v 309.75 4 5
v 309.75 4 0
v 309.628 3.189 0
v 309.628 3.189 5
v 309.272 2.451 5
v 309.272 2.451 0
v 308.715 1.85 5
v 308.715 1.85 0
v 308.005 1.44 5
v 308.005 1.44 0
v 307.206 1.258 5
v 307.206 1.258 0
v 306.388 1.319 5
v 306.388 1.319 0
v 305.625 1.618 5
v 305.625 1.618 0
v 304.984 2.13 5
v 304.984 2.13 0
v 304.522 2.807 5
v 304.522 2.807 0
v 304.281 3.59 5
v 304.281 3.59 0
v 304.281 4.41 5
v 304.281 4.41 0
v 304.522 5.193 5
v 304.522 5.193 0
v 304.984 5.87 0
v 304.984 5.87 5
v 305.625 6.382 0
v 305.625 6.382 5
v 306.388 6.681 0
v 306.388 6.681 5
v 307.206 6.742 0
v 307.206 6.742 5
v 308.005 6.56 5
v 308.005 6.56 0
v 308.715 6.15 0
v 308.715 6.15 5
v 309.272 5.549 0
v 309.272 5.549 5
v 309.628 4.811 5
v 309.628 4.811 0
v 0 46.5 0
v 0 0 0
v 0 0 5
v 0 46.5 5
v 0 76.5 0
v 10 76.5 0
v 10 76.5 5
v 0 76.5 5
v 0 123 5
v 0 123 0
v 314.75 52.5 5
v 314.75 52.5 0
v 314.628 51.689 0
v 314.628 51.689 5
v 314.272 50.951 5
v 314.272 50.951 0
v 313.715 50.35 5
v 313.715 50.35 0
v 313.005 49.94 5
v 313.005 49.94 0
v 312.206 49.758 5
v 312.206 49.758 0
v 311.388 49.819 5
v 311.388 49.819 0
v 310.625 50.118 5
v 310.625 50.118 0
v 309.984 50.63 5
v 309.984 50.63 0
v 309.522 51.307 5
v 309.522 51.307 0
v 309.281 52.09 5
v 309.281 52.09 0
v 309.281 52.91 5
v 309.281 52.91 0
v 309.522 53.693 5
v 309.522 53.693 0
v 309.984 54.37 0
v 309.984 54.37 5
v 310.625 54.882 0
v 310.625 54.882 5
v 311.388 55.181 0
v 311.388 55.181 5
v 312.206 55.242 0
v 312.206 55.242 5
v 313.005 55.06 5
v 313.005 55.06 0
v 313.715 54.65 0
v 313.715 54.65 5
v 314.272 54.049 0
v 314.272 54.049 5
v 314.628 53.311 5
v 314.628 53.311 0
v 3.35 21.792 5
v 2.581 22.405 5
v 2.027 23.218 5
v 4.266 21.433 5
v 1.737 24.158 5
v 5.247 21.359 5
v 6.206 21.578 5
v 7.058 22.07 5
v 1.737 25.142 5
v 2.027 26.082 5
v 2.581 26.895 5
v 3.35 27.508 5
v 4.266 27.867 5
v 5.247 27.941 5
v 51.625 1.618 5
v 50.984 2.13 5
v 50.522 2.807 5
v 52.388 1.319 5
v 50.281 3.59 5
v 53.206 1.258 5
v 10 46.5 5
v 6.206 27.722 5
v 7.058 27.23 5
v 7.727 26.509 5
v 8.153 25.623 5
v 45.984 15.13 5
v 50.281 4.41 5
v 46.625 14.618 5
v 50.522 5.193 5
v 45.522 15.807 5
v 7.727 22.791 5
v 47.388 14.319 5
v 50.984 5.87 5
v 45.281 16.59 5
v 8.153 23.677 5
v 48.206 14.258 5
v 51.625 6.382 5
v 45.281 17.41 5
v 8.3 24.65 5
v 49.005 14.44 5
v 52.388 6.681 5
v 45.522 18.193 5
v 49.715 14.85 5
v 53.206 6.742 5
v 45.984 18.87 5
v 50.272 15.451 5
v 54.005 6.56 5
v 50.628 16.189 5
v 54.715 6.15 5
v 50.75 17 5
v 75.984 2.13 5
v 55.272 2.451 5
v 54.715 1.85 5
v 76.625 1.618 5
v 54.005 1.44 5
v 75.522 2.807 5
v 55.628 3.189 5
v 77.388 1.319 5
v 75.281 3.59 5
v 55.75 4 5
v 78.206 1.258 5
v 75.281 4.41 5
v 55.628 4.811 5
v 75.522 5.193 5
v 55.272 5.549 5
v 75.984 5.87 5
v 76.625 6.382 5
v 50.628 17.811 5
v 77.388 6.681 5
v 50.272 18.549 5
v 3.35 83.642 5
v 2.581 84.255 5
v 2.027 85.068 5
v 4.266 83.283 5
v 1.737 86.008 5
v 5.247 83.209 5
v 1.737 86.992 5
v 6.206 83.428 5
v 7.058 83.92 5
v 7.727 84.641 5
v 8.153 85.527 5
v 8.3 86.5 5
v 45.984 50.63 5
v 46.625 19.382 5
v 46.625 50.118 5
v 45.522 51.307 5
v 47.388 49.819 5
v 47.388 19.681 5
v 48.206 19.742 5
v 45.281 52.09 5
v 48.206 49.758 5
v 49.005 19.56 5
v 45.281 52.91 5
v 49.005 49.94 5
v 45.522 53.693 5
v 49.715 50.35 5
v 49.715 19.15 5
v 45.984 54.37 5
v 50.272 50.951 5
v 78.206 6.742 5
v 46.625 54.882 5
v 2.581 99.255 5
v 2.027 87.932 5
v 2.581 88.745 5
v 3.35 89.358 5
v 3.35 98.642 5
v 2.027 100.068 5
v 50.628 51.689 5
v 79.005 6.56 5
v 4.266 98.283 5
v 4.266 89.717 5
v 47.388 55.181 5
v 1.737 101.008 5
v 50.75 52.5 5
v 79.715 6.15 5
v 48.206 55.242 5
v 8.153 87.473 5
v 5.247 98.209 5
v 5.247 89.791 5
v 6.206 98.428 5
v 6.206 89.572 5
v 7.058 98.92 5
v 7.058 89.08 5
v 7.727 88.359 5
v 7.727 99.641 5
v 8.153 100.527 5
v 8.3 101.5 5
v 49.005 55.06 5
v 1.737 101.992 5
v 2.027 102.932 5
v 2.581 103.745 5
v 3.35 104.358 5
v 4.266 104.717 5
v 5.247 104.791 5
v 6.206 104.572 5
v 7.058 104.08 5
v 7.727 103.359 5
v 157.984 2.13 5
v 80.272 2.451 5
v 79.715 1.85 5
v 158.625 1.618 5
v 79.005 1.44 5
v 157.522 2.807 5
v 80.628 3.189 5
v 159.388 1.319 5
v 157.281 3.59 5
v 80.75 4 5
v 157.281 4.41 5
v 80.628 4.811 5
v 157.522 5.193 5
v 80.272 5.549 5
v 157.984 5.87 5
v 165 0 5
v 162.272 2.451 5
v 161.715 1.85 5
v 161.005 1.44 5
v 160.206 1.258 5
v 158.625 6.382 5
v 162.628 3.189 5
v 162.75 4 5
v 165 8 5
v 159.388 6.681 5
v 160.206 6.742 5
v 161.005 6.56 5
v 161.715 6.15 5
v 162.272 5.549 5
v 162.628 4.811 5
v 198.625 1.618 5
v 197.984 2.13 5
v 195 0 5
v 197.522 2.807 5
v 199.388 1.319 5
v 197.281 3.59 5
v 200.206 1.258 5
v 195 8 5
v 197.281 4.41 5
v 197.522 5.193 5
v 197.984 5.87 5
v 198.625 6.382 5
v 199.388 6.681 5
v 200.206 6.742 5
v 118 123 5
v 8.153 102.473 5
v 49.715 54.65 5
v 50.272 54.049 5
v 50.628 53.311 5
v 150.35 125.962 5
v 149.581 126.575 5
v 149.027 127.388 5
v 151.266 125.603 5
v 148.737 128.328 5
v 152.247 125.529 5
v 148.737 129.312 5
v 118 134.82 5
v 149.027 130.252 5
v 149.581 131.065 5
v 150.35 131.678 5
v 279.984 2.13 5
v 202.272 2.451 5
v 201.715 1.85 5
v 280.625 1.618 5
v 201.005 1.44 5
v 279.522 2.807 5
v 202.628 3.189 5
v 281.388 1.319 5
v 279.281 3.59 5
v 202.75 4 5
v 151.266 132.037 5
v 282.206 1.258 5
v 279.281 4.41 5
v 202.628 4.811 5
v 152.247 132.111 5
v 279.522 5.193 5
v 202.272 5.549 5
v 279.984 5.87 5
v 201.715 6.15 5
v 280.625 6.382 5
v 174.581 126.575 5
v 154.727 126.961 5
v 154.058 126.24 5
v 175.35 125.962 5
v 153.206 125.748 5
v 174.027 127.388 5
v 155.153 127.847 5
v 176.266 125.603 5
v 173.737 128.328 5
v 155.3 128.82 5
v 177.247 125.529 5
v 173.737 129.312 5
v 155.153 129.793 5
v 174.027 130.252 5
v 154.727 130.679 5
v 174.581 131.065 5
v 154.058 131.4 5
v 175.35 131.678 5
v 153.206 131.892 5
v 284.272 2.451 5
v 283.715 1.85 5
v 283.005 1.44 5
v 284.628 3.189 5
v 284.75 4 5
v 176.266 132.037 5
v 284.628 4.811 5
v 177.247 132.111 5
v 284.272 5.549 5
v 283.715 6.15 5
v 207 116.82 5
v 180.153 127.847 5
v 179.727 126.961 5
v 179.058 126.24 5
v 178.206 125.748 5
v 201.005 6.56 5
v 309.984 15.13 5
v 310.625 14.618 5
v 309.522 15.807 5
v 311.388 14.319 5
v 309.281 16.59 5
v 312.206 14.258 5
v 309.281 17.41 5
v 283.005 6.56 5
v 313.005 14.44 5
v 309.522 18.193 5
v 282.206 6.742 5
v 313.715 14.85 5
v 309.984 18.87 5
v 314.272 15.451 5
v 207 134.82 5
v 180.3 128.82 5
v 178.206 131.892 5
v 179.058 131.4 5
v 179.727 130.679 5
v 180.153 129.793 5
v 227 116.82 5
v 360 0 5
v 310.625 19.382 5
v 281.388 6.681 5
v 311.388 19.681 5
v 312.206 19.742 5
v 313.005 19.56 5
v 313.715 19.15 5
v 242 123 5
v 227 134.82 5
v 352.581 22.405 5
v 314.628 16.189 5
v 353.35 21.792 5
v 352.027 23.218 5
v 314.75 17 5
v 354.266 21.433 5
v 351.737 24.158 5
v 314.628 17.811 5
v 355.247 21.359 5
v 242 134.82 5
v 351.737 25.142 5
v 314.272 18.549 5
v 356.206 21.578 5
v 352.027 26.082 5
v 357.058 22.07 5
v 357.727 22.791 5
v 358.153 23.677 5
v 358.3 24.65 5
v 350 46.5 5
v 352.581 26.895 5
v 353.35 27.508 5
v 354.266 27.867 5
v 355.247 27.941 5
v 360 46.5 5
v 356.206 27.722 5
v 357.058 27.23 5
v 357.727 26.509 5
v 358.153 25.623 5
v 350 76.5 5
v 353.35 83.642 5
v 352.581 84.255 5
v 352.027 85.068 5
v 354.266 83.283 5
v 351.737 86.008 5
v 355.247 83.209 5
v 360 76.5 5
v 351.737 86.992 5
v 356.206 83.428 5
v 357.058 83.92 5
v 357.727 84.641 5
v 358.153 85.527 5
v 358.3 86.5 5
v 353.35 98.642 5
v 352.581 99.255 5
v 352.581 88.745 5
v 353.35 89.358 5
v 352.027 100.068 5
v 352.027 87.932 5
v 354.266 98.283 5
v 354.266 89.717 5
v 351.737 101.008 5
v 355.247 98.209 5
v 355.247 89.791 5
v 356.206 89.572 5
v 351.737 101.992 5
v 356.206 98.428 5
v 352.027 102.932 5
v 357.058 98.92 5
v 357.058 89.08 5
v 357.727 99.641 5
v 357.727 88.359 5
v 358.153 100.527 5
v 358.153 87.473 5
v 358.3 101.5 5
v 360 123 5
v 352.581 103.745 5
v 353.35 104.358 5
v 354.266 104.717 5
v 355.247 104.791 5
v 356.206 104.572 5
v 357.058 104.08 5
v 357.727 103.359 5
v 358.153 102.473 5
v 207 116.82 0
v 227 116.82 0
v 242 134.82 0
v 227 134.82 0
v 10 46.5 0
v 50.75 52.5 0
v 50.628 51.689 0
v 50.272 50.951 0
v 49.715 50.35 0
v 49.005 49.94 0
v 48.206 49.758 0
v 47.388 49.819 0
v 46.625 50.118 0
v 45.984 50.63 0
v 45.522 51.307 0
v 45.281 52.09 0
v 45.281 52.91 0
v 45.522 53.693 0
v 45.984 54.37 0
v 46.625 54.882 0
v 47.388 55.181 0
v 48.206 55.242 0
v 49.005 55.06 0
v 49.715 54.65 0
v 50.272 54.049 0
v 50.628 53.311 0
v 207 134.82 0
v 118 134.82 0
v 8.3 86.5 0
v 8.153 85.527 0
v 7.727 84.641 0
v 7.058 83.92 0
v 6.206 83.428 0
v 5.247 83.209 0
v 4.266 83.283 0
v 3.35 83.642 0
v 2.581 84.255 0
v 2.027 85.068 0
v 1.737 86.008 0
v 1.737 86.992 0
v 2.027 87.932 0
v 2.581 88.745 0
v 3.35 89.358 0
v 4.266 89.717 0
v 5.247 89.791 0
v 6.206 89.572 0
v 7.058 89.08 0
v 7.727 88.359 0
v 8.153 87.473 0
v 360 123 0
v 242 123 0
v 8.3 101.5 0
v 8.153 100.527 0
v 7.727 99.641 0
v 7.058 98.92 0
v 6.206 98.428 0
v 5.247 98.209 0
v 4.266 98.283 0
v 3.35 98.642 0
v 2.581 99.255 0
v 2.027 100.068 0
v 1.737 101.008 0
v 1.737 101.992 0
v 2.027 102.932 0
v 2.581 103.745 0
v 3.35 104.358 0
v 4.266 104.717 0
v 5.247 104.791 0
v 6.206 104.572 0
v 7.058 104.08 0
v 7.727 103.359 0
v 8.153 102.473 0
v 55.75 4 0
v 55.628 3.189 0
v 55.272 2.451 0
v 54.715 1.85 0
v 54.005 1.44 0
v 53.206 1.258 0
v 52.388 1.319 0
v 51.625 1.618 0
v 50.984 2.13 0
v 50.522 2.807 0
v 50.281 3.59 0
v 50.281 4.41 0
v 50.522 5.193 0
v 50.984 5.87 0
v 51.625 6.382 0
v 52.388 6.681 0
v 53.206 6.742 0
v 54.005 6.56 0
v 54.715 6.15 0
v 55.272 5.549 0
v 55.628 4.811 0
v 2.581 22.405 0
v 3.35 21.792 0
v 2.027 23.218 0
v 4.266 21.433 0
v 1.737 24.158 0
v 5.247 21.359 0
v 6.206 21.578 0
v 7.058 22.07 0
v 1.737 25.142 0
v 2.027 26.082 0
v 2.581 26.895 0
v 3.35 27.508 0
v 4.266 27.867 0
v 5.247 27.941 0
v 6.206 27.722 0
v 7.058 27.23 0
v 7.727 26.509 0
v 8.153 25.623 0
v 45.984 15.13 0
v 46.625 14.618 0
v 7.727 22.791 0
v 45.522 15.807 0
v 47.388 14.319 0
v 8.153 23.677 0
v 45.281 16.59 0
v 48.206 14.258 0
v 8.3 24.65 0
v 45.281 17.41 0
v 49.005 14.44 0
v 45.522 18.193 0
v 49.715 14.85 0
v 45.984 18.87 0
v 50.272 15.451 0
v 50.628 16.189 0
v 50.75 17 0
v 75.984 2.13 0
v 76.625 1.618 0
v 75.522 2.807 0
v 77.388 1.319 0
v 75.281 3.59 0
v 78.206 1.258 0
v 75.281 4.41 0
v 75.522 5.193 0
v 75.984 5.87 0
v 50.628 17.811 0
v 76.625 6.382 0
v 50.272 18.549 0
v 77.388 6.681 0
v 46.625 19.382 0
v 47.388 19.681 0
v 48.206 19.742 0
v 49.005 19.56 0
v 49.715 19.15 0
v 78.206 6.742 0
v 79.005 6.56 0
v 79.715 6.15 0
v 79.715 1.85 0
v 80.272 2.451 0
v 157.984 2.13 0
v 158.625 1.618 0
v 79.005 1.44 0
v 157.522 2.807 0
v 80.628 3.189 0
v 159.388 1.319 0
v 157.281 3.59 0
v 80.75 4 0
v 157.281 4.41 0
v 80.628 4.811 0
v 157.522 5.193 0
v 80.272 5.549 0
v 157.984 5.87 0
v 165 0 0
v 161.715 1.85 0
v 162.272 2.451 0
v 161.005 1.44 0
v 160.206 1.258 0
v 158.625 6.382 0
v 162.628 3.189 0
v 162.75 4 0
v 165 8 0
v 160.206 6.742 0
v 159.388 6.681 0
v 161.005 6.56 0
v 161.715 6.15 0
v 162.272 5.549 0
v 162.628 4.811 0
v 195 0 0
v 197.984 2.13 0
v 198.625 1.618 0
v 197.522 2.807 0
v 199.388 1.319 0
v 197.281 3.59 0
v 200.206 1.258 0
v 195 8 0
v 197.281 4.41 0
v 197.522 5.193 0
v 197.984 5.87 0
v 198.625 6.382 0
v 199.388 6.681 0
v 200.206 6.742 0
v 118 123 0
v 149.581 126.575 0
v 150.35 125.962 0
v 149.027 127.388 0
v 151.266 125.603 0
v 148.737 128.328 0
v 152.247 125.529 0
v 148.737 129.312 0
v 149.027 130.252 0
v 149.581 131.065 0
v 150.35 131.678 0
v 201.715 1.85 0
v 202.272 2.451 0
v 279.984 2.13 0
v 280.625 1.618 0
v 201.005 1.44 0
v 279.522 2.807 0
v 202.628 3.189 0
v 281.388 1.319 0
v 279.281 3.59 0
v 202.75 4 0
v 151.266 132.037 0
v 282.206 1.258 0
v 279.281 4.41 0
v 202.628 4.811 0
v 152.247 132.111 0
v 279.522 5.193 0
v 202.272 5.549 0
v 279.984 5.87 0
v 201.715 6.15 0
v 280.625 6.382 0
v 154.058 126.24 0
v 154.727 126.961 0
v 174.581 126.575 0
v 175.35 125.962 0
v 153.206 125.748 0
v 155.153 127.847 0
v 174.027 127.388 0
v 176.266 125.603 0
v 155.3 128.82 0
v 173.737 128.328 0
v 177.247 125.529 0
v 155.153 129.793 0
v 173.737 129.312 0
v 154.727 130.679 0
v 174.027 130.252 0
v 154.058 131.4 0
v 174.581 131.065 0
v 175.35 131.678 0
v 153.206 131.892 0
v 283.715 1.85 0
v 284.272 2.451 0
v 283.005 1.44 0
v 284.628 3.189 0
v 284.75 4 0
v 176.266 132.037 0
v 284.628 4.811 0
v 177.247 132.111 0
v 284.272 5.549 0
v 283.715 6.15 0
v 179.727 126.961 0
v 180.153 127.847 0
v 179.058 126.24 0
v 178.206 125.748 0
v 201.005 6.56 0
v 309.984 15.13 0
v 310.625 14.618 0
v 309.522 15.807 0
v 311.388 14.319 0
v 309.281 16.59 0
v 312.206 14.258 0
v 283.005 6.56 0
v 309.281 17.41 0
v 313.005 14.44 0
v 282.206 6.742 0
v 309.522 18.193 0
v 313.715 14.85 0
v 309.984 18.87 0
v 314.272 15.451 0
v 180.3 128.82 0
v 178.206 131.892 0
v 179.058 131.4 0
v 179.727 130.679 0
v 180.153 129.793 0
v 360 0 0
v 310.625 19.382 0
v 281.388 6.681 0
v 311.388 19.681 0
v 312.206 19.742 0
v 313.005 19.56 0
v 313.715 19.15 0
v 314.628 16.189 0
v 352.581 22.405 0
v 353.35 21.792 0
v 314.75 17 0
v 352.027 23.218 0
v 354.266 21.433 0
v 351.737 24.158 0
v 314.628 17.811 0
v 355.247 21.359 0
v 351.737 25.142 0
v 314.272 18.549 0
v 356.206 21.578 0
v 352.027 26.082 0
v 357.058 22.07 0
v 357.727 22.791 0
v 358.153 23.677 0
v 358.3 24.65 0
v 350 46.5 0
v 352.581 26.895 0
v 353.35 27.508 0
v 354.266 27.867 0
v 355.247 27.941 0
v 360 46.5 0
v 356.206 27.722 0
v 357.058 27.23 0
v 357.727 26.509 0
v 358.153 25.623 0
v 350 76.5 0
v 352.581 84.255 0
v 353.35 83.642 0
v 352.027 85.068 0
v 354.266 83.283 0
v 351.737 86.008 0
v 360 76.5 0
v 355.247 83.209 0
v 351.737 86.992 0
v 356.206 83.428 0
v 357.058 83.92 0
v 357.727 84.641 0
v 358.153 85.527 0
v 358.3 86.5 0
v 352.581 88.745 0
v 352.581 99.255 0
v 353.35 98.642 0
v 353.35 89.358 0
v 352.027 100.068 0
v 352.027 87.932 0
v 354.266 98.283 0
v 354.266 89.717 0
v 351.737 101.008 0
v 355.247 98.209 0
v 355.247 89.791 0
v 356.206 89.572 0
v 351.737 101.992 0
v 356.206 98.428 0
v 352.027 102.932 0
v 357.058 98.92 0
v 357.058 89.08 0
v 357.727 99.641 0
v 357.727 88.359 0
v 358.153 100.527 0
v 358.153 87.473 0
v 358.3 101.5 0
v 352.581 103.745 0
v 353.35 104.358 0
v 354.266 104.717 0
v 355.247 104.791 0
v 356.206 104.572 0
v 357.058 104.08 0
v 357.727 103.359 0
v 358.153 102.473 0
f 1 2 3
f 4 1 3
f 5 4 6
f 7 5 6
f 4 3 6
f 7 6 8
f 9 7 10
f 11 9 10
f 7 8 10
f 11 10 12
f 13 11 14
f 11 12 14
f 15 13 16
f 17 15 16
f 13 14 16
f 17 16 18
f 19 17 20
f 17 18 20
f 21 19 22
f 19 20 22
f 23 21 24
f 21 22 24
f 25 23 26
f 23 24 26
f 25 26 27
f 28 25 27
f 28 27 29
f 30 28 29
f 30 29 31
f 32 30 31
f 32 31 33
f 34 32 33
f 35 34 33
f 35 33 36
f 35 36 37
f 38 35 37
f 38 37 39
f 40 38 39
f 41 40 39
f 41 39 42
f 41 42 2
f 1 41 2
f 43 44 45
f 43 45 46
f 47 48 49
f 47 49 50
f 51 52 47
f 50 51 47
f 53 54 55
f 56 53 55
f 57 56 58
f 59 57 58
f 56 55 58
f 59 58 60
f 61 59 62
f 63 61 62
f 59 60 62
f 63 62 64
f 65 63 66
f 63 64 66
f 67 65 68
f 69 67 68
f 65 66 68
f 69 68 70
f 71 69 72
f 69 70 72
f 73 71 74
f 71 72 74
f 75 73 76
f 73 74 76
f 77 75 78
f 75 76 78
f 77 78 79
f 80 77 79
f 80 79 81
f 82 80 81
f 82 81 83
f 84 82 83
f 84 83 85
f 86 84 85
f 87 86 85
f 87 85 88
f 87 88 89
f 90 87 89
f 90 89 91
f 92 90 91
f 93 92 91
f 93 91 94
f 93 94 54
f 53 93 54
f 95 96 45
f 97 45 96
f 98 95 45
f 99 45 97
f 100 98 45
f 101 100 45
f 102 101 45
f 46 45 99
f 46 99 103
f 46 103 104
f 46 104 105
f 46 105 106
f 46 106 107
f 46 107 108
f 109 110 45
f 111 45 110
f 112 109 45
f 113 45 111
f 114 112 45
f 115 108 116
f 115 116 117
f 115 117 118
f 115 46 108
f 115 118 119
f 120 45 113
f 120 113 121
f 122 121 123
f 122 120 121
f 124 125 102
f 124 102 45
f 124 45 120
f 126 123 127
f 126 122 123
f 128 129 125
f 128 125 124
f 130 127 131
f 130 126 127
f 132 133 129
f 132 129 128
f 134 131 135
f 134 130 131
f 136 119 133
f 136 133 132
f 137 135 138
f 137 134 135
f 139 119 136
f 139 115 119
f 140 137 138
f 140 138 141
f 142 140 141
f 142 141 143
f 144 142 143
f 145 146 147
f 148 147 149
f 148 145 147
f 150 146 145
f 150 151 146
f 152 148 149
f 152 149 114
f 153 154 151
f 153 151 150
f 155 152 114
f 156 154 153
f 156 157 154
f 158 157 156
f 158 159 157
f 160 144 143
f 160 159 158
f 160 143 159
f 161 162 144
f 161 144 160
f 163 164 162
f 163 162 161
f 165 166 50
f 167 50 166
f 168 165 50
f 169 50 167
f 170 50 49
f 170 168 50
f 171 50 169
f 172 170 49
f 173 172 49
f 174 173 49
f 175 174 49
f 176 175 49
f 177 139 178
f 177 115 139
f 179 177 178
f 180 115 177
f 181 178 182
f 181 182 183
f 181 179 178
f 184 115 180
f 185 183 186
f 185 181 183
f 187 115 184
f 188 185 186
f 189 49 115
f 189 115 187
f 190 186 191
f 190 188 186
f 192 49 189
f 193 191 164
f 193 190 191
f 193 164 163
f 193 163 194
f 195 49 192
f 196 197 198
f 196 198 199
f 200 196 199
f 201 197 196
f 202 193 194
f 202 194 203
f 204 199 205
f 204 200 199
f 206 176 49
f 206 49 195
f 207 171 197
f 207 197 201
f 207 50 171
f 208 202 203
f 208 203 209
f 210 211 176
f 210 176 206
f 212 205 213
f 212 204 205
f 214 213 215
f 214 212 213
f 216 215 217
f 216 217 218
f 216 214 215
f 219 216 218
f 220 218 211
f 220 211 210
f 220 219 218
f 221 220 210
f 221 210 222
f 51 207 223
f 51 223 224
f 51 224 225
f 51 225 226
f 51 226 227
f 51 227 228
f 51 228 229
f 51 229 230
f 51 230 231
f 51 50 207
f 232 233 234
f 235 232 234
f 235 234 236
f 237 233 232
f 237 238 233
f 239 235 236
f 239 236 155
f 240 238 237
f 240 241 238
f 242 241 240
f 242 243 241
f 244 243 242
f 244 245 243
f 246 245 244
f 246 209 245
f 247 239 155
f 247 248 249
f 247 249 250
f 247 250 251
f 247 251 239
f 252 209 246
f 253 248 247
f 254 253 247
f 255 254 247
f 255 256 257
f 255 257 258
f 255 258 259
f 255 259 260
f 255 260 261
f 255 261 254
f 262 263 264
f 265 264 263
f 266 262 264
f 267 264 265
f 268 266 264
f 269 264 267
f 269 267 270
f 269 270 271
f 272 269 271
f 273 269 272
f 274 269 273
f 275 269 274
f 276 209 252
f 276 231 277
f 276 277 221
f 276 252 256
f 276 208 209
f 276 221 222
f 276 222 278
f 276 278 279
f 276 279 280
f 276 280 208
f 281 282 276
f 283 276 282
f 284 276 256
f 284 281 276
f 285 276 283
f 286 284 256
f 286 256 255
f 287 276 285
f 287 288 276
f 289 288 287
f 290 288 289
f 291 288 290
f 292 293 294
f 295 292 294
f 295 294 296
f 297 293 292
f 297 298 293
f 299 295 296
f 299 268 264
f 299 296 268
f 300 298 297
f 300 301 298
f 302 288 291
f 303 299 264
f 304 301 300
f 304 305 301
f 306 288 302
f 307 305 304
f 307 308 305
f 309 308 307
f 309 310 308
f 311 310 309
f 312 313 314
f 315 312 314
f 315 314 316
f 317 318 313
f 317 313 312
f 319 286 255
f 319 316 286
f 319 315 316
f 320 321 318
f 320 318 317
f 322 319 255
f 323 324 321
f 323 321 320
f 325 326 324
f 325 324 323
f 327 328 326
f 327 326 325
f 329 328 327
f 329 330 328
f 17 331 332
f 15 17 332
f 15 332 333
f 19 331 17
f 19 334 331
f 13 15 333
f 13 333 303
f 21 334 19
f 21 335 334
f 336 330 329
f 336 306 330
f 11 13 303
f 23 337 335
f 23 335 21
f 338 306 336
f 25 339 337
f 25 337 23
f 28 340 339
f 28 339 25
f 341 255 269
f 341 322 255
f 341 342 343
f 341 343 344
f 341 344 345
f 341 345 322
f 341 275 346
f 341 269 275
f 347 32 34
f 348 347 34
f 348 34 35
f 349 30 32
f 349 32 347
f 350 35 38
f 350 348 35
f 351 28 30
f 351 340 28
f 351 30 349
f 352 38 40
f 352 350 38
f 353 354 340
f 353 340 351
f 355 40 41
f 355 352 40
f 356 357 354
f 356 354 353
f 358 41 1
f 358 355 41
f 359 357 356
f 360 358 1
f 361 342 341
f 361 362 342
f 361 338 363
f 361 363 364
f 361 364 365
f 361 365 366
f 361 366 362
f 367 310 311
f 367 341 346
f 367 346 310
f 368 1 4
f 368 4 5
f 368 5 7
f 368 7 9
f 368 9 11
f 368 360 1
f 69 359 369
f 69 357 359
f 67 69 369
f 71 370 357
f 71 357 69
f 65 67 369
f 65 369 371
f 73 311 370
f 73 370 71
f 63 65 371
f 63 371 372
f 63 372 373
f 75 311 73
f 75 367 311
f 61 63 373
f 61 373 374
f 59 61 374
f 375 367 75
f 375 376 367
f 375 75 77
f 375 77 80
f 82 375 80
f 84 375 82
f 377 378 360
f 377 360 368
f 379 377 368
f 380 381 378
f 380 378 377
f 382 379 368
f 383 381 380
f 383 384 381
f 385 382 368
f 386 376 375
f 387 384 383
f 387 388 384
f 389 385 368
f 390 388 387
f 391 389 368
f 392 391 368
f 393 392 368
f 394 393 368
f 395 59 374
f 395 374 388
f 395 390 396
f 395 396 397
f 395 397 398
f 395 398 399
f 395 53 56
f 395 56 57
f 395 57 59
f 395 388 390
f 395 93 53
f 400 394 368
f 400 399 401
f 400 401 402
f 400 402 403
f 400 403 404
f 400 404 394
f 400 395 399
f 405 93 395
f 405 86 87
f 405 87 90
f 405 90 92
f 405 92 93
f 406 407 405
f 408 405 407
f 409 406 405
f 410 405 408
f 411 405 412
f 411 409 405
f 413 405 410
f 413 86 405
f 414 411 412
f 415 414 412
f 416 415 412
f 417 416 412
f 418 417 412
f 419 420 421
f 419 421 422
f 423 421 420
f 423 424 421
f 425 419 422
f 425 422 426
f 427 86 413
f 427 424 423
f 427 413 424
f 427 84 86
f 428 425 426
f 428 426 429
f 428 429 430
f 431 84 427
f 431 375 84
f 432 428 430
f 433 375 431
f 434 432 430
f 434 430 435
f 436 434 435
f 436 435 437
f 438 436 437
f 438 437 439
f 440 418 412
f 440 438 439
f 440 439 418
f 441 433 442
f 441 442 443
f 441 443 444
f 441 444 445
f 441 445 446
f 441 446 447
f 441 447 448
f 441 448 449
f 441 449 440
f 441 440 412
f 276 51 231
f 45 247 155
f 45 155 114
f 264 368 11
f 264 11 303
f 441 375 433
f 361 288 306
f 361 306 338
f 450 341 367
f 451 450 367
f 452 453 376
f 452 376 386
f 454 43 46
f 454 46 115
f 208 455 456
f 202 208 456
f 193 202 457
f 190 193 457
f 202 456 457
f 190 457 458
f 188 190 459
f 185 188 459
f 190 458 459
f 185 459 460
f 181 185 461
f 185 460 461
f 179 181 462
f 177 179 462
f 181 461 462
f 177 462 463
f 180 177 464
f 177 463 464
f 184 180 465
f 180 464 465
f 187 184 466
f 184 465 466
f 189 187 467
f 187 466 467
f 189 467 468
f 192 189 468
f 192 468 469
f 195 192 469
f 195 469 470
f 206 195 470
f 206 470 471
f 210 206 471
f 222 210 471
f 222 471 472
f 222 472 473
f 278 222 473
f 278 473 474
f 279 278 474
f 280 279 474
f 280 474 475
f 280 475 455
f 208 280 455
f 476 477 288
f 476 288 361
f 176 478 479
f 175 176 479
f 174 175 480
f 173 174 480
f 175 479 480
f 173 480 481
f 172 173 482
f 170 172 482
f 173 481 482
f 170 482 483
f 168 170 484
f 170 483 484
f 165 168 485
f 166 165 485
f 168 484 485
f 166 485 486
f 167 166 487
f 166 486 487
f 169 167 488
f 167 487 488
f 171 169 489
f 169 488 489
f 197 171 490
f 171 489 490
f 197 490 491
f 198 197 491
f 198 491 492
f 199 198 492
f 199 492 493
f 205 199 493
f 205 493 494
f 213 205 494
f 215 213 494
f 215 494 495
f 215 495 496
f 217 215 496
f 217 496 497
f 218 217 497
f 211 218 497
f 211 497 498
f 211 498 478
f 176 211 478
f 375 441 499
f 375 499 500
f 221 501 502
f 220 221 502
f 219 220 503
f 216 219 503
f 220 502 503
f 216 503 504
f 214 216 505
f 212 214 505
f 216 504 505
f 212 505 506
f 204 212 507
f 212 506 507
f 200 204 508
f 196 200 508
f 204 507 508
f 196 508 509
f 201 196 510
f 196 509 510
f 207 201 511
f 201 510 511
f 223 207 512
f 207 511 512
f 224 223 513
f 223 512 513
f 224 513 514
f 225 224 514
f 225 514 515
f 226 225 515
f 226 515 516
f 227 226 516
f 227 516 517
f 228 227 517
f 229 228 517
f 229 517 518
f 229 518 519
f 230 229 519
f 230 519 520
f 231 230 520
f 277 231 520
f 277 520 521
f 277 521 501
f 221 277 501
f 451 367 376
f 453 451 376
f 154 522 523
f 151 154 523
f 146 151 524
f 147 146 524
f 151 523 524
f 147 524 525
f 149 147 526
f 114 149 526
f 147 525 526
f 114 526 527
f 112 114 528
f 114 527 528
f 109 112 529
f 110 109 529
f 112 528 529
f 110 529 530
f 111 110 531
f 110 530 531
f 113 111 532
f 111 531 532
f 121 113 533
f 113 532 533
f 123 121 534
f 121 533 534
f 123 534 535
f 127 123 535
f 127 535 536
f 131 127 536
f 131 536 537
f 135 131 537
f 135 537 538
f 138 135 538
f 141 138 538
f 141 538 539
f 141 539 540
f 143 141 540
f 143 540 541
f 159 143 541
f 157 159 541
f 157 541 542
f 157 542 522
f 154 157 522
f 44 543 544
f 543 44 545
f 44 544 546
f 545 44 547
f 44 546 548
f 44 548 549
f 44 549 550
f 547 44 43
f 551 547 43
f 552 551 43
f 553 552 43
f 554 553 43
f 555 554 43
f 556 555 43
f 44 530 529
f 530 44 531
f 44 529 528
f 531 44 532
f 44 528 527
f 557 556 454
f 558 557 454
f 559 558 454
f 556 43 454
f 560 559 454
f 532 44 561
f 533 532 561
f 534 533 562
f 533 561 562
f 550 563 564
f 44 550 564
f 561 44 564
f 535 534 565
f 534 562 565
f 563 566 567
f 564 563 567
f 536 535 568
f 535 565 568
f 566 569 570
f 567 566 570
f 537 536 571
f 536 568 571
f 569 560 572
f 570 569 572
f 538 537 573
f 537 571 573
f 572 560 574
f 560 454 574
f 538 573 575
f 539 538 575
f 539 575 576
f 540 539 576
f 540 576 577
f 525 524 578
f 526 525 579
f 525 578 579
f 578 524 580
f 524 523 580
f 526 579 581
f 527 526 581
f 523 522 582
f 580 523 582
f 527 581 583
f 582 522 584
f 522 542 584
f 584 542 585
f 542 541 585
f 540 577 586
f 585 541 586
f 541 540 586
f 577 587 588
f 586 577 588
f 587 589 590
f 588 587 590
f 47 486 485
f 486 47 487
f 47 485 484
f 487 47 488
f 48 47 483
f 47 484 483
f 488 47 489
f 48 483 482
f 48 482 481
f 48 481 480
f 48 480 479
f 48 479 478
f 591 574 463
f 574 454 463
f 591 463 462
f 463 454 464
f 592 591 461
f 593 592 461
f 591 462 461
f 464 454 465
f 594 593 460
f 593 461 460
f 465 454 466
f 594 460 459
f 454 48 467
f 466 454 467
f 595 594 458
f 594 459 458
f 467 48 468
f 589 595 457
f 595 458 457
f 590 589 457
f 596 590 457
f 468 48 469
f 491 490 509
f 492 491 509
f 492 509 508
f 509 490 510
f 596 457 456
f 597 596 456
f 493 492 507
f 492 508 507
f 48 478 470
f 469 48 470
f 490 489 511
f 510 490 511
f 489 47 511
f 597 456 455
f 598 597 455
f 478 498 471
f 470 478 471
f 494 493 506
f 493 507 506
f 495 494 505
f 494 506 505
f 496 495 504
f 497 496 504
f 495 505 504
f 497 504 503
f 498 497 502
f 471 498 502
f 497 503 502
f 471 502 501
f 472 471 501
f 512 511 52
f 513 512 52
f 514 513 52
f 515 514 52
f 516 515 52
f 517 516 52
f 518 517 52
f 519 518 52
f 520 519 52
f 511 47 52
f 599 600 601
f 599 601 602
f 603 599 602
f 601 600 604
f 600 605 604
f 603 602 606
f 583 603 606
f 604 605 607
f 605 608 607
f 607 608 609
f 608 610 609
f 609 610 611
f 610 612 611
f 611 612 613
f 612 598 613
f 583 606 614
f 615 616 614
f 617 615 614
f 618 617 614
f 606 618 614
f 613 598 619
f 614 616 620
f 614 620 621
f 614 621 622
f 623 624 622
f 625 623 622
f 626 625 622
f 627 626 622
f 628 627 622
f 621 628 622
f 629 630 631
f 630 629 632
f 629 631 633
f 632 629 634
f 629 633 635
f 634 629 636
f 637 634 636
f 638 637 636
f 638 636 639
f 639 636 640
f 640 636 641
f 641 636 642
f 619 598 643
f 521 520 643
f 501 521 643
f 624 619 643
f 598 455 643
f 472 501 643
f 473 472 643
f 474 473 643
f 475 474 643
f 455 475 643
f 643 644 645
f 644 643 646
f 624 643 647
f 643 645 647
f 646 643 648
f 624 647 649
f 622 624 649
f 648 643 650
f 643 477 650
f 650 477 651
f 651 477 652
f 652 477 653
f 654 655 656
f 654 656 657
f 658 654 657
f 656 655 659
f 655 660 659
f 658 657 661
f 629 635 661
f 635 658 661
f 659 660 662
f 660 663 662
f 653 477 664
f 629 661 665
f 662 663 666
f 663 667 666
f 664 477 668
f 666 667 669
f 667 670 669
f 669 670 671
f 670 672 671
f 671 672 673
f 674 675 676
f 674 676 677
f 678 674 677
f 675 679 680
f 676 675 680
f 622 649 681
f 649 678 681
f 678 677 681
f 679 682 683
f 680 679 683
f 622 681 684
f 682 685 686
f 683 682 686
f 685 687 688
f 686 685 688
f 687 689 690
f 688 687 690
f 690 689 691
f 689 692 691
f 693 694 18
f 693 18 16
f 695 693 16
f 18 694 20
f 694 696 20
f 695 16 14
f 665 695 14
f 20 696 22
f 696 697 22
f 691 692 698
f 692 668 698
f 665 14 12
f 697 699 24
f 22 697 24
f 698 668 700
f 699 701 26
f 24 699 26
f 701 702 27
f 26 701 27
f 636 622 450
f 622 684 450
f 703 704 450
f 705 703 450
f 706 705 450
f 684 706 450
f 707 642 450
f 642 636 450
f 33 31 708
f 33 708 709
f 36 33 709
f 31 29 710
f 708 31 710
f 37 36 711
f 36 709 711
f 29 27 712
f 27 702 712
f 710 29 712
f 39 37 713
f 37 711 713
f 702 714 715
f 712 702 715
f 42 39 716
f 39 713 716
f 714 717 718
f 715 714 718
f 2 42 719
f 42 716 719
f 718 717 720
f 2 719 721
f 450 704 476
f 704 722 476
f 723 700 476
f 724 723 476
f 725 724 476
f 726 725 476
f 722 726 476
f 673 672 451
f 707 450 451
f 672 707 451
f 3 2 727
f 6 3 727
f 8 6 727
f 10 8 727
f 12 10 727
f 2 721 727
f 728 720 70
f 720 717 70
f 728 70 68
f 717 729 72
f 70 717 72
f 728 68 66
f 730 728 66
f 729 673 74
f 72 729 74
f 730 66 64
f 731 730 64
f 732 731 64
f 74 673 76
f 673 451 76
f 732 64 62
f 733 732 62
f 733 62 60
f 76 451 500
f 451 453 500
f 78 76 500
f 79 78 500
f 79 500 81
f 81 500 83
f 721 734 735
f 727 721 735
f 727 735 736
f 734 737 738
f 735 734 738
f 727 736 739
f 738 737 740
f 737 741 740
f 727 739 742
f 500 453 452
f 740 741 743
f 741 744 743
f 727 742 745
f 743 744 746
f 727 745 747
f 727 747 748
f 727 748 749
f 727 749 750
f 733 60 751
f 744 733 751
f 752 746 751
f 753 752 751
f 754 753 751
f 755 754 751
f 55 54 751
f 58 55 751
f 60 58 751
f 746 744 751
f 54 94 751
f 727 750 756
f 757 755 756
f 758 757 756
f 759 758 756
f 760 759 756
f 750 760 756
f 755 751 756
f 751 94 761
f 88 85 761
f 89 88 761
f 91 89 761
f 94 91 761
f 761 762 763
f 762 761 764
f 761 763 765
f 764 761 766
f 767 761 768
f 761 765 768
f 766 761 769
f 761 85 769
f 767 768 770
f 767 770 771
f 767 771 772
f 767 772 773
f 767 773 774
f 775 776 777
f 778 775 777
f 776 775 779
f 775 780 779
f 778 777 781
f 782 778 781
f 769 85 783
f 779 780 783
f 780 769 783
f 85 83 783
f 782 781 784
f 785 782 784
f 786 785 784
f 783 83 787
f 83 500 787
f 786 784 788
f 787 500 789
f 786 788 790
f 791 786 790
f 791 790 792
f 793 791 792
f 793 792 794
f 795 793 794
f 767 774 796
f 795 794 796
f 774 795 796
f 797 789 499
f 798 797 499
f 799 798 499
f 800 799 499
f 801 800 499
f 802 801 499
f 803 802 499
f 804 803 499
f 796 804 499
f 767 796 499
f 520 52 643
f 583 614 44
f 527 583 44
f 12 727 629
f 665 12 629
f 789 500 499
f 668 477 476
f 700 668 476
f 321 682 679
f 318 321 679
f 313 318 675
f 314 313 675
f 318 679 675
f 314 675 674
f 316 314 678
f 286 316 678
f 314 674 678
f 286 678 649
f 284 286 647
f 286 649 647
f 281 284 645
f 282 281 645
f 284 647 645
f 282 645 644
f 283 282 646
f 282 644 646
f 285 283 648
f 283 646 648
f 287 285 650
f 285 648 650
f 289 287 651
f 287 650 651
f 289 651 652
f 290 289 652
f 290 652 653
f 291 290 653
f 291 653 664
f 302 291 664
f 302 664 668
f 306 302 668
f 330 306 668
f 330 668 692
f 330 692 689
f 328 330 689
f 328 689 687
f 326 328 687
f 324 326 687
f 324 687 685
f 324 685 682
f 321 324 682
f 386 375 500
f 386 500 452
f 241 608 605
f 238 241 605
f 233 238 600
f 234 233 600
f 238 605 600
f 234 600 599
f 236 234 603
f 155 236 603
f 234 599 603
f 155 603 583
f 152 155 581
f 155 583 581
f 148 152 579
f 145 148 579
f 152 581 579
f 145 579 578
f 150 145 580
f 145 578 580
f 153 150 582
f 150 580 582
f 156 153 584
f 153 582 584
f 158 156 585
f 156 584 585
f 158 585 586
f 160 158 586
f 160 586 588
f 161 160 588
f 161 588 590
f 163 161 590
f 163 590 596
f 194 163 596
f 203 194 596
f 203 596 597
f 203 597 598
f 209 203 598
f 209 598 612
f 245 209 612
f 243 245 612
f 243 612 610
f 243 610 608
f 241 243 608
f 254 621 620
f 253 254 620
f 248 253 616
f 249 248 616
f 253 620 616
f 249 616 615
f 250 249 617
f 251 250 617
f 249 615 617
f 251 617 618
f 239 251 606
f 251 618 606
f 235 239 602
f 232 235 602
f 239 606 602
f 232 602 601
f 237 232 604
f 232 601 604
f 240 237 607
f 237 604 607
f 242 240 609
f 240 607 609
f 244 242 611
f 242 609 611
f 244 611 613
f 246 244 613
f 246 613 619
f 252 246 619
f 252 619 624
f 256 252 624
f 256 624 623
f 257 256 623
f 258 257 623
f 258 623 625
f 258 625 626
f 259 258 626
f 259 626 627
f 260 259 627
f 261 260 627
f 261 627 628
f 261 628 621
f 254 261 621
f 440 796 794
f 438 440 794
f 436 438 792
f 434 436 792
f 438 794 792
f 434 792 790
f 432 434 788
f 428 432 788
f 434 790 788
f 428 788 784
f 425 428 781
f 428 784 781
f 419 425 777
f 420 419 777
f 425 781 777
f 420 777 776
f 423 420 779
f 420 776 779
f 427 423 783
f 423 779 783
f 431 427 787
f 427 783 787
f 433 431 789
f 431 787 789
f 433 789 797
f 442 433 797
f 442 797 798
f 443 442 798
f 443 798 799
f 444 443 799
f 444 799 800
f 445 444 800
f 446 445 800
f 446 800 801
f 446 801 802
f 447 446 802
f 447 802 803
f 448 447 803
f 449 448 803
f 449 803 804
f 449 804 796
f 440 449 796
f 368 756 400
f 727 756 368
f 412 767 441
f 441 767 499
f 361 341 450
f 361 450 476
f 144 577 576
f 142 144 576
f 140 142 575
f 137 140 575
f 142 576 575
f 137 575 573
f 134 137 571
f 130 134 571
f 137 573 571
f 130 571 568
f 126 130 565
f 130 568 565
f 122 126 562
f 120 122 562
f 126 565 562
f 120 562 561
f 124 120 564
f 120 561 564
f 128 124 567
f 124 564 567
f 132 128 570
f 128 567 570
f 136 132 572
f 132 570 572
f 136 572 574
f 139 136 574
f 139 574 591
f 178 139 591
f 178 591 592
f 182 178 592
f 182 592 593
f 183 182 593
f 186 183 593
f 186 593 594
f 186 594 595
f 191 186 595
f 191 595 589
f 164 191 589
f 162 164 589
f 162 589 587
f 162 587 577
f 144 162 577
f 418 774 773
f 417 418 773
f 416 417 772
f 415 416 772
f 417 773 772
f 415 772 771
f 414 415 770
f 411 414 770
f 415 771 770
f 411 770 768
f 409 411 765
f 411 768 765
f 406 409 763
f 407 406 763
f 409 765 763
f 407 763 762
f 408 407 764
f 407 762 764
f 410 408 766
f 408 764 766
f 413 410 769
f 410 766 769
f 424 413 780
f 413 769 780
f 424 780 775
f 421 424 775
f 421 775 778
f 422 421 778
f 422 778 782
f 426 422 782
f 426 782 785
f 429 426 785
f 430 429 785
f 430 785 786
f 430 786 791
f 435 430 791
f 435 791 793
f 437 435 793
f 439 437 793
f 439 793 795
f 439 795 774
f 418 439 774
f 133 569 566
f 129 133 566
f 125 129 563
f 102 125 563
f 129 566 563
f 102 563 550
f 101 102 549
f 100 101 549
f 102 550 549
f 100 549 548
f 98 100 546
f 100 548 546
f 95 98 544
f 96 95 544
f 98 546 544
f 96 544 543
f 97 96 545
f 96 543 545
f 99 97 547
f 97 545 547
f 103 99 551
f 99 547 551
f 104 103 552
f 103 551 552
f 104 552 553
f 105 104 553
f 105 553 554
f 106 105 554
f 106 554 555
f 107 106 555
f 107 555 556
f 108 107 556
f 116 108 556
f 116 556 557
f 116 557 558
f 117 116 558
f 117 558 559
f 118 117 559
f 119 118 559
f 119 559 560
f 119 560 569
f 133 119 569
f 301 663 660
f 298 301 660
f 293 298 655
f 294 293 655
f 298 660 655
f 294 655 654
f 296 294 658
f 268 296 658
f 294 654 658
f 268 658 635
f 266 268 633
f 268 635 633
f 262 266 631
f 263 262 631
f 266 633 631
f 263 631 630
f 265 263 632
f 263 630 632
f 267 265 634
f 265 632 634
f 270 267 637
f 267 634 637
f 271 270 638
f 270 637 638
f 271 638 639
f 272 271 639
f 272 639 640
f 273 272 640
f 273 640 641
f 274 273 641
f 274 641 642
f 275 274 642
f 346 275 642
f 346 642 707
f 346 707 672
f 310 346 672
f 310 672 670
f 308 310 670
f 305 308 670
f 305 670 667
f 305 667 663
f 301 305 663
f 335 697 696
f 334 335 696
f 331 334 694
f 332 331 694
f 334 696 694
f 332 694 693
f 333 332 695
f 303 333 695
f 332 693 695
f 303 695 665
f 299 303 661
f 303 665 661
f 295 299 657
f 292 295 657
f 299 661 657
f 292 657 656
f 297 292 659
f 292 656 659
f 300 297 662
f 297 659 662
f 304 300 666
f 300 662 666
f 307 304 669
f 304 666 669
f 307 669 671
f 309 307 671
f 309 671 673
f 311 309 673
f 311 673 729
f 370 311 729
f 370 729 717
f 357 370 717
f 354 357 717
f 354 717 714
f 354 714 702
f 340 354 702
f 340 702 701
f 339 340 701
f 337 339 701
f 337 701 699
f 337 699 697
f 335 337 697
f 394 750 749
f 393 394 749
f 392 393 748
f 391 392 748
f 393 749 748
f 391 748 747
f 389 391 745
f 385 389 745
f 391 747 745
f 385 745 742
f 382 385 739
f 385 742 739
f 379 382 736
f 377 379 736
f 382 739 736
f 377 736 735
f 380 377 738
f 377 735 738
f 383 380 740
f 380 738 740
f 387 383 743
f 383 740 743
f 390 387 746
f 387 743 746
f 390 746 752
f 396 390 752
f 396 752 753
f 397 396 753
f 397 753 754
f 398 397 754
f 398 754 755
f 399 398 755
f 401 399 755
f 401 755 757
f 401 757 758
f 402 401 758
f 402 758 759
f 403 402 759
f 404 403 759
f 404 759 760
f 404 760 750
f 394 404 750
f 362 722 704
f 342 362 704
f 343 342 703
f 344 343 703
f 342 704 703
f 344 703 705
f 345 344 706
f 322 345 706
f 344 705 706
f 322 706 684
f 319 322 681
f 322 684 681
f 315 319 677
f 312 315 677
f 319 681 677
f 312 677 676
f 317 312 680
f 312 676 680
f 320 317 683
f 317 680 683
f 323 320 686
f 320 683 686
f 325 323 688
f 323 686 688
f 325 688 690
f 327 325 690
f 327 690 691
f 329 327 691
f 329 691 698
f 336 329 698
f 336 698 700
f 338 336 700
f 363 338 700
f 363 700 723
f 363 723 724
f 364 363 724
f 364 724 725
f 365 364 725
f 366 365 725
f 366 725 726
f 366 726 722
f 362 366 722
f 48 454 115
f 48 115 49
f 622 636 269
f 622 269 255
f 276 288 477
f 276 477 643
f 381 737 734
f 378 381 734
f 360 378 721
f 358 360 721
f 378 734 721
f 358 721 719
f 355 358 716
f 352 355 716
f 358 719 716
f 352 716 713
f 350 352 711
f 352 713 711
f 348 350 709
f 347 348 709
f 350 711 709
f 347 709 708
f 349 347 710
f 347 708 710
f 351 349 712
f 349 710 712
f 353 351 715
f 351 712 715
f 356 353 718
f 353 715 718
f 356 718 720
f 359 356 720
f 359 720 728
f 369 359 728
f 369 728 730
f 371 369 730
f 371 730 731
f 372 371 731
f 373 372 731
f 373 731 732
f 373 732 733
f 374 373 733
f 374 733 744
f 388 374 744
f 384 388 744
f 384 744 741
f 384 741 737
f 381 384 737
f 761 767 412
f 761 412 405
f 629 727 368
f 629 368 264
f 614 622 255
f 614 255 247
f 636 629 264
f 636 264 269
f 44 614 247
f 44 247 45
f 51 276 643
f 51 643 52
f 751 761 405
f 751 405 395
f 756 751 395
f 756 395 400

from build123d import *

# Parameters (mm, degrees)
RESSALTO_EXTRUS_O1_DEPTH = 5
FURO_COM_FOLGA_DE_M61_D  = 6.6
FURO_COM_FOLGA_DE_M51_D  = 5.5
RESSALTO_EXTRUS_O3_DEPTH = 5
CORTE_EXTRUS_O1_DEPTH    = 419.231218825
ESBO_O19_W               = 20
ESBO_O19_H               = 18
CORTE_EXTRUS_O2_DEPTH    = 385.449518663


with BuildPart() as part:
    # Esboço1 → Ressalto-extrusão1 (new body)
    with BuildSketch(Plane.XY):
        Polygon((0, 76.5), (0, 132.32), (0, 172.82), (116, 172.82), (116, 134.82), (244, 134.82), (244, 172.82), (360, 172.82), (360, 132.32), (360, 76.5), (350, 76.5), (350, 46.5), (360, 46.5), (360, 0), (195, 0), (195, 8), (165, 8), (165, 0), (0, 0), (0, 46.5), (10, 46.5), (10, 76.5), align=None)
    extrude(amount=RESSALTO_EXTRUS_O1_DEPTH)

    # Furo com folga de M61 (through all)
    with Locations(Plane(origin=(-158.278165294, -245.41916969, 5), x_dir=(-1, 0, 0), z_dir=(0, 0, 1))):
        with Locations((-163.278165294, -331.91916969), (-163.278165294, -270.06916969), (-513.278165294, -331.91916969), (-513.278165294, -270.06916969), (-458.278165294, -374.23916969), (-428.278165294, -374.23916969), (-248.278165294, -374.23916969), (-218.278165294, -374.23916969), (-335.278165294, -374.23916969), (-163.278165294, -346.91916969), (-513.278165294, -346.91916969), (-310.278165294, -374.23916969)):
            Hole(FURO_COM_FOLGA_DE_M61_D / 2)

    # Furo com folga de M51 (through all)
    with Locations(Plane(origin=(-158.278165294, -245.41916969, 5), x_dir=(-1, 0, 0), z_dir=(0, 0, 1))):
        with Locations((-470.278165294, -297.91916969), (-470.278165294, -262.41916969), (-206.278165294, -297.91916969), (-206.278165294, -262.41916969), (-465.278165294, -249.41916969), (-440.278165294, -249.41916969), (-358.278165294, -249.41916969), (-318.278165294, -249.41916969), (-236.278165294, -249.41916969), (-211.278165294, -249.41916969)):
            Hole(FURO_COM_FOLGA_DE_M51_D / 2)

    # Esboço15 → Ressalto-extrusão3 (add, through all)
    with BuildSketch(Plane.XY.offset(5)):
        Polygon((100, 172.82), (100, 212.82), (0, 172.82), align=None)
        Polygon((260, 172.82), (260, 212.82), (360, 172.82), align=None)
    extrude(amount=-RESSALTO_EXTRUS_O3_DEPTH)

    # Esboço18 → Corte-extrusão1 (cut, through all)
    with BuildSketch(Plane.XY.offset(5)):
        Polygon((118, 134.82), (118, 123), (0, 123), (0, 223), (360, 223), (360, 123), (242, 123), (242, 134.82), align=None)
    extrude(amount=-CORTE_EXTRUS_O1_DEPTH, mode=Mode.SUBTRACT)

    # Esboço19 → Corte-extrusão2 (cut, through all)
    with BuildSketch(Plane.XY.offset(5)):
        with Locations((217, 125.82)):
            Rectangle(ESBO_O19_W, ESBO_O19_H)
    extrude(amount=-CORTE_EXTRUS_O2_DEPTH, mode=Mode.SUBTRACT)


solid = part.part
